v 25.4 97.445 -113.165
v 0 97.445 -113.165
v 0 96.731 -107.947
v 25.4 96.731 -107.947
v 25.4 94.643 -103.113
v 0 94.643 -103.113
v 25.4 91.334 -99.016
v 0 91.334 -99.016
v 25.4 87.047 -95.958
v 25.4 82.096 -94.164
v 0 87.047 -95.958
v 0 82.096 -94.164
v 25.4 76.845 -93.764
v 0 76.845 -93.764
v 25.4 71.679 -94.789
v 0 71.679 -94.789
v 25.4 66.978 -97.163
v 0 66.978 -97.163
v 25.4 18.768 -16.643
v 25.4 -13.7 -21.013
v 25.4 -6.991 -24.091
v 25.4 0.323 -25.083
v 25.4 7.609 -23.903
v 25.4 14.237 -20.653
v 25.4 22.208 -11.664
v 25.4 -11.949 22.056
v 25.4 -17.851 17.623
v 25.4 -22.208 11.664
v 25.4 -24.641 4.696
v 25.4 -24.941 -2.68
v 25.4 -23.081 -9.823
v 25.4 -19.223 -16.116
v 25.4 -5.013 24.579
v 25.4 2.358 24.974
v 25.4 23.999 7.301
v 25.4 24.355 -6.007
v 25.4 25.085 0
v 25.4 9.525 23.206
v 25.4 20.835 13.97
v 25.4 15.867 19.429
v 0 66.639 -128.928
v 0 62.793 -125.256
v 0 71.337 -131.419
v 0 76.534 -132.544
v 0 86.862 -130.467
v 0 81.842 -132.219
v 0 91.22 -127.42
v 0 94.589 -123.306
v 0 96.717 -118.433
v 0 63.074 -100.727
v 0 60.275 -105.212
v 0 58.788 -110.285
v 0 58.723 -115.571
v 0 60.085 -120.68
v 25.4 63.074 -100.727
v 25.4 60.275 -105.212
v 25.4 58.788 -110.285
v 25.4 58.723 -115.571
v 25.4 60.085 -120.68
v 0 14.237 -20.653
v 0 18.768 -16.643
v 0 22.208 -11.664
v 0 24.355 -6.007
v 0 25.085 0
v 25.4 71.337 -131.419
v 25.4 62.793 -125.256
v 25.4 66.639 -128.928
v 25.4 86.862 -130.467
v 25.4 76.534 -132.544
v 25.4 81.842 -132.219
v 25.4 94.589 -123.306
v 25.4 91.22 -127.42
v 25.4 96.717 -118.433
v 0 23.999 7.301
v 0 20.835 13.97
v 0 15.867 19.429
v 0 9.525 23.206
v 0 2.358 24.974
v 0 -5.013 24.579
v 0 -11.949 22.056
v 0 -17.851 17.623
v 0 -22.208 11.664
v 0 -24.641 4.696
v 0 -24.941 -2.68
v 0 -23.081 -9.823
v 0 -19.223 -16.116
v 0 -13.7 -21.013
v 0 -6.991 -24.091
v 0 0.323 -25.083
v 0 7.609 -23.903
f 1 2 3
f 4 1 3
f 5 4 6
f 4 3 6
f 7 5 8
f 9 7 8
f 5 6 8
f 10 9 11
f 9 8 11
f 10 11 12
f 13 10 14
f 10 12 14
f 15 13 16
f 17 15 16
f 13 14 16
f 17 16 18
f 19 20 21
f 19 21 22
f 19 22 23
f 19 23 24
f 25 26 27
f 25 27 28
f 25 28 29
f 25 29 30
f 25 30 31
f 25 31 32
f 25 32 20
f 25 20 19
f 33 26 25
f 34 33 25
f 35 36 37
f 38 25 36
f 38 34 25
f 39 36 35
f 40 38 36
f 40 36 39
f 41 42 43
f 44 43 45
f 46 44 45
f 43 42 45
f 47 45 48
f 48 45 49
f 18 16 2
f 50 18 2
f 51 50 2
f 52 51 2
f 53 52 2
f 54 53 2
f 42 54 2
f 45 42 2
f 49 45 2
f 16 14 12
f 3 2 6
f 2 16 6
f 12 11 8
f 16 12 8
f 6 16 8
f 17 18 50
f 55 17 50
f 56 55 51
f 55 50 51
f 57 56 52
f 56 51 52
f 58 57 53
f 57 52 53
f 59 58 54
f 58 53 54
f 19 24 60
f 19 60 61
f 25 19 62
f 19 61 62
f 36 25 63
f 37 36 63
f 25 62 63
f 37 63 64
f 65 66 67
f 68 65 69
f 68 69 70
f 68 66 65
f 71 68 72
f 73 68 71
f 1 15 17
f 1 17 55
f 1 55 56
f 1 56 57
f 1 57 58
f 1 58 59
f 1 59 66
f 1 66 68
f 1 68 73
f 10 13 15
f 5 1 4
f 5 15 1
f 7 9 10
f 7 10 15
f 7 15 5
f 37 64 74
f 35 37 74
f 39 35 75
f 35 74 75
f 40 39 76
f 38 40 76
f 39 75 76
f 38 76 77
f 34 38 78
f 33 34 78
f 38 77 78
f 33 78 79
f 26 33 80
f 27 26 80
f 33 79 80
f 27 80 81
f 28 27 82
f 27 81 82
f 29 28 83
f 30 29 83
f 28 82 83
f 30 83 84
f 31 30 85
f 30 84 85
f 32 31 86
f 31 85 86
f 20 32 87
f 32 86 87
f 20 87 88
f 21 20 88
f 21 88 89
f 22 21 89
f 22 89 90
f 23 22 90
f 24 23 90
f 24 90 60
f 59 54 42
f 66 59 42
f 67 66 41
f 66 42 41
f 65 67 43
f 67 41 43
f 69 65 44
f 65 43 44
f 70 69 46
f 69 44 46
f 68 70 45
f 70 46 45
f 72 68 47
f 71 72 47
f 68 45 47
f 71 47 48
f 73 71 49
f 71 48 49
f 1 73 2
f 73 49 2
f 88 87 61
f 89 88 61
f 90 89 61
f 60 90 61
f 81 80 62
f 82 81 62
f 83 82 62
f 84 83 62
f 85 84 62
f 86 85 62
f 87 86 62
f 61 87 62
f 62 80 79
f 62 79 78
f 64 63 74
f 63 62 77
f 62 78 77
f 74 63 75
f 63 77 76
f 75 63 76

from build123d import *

# Parameters (mm, degrees)
F1_DEPTH = 25.4


with BuildPart() as f1:
    # F0 (on Right) → F1 (new body)
    with BuildSketch(Plane.YZ):
        with BuildLine():
            ThreePointArc((97.444769, -113.164909), (87.046637, -95.958308), (66.978323, -97.162906))
            Line((66.978323, -97.162906), (78.009151, -113.164909))
            Line((78.009151, -113.164909), (60.085036, -120.679519))
            ThreePointArc((60.085036, -120.679519), (81.841709, -132.218905), (97.444769, -113.164909))
        make_face()
        with BuildLine():
            ThreePointArc((14.236965, -20.653024), (22.207741, -11.664253), (25.084628, 0))
            ThreePointArc((25.084628, 0), (-22.207741, 11.664253), (14.236965, -20.653024))
        make_face()
        with BuildLine():
            Line((78.009151, -113.164909), (66.978323, -97.162906))
            ThreePointArc((66.978323, -97.162906), (59.358281, -107.697889), (60.085036, -120.679519))
            Line((60.085036, -120.679519), (78.009151, -113.164909))
        make_face()
    extrude(amount=F1_DEPTH)


solid = f1.part
